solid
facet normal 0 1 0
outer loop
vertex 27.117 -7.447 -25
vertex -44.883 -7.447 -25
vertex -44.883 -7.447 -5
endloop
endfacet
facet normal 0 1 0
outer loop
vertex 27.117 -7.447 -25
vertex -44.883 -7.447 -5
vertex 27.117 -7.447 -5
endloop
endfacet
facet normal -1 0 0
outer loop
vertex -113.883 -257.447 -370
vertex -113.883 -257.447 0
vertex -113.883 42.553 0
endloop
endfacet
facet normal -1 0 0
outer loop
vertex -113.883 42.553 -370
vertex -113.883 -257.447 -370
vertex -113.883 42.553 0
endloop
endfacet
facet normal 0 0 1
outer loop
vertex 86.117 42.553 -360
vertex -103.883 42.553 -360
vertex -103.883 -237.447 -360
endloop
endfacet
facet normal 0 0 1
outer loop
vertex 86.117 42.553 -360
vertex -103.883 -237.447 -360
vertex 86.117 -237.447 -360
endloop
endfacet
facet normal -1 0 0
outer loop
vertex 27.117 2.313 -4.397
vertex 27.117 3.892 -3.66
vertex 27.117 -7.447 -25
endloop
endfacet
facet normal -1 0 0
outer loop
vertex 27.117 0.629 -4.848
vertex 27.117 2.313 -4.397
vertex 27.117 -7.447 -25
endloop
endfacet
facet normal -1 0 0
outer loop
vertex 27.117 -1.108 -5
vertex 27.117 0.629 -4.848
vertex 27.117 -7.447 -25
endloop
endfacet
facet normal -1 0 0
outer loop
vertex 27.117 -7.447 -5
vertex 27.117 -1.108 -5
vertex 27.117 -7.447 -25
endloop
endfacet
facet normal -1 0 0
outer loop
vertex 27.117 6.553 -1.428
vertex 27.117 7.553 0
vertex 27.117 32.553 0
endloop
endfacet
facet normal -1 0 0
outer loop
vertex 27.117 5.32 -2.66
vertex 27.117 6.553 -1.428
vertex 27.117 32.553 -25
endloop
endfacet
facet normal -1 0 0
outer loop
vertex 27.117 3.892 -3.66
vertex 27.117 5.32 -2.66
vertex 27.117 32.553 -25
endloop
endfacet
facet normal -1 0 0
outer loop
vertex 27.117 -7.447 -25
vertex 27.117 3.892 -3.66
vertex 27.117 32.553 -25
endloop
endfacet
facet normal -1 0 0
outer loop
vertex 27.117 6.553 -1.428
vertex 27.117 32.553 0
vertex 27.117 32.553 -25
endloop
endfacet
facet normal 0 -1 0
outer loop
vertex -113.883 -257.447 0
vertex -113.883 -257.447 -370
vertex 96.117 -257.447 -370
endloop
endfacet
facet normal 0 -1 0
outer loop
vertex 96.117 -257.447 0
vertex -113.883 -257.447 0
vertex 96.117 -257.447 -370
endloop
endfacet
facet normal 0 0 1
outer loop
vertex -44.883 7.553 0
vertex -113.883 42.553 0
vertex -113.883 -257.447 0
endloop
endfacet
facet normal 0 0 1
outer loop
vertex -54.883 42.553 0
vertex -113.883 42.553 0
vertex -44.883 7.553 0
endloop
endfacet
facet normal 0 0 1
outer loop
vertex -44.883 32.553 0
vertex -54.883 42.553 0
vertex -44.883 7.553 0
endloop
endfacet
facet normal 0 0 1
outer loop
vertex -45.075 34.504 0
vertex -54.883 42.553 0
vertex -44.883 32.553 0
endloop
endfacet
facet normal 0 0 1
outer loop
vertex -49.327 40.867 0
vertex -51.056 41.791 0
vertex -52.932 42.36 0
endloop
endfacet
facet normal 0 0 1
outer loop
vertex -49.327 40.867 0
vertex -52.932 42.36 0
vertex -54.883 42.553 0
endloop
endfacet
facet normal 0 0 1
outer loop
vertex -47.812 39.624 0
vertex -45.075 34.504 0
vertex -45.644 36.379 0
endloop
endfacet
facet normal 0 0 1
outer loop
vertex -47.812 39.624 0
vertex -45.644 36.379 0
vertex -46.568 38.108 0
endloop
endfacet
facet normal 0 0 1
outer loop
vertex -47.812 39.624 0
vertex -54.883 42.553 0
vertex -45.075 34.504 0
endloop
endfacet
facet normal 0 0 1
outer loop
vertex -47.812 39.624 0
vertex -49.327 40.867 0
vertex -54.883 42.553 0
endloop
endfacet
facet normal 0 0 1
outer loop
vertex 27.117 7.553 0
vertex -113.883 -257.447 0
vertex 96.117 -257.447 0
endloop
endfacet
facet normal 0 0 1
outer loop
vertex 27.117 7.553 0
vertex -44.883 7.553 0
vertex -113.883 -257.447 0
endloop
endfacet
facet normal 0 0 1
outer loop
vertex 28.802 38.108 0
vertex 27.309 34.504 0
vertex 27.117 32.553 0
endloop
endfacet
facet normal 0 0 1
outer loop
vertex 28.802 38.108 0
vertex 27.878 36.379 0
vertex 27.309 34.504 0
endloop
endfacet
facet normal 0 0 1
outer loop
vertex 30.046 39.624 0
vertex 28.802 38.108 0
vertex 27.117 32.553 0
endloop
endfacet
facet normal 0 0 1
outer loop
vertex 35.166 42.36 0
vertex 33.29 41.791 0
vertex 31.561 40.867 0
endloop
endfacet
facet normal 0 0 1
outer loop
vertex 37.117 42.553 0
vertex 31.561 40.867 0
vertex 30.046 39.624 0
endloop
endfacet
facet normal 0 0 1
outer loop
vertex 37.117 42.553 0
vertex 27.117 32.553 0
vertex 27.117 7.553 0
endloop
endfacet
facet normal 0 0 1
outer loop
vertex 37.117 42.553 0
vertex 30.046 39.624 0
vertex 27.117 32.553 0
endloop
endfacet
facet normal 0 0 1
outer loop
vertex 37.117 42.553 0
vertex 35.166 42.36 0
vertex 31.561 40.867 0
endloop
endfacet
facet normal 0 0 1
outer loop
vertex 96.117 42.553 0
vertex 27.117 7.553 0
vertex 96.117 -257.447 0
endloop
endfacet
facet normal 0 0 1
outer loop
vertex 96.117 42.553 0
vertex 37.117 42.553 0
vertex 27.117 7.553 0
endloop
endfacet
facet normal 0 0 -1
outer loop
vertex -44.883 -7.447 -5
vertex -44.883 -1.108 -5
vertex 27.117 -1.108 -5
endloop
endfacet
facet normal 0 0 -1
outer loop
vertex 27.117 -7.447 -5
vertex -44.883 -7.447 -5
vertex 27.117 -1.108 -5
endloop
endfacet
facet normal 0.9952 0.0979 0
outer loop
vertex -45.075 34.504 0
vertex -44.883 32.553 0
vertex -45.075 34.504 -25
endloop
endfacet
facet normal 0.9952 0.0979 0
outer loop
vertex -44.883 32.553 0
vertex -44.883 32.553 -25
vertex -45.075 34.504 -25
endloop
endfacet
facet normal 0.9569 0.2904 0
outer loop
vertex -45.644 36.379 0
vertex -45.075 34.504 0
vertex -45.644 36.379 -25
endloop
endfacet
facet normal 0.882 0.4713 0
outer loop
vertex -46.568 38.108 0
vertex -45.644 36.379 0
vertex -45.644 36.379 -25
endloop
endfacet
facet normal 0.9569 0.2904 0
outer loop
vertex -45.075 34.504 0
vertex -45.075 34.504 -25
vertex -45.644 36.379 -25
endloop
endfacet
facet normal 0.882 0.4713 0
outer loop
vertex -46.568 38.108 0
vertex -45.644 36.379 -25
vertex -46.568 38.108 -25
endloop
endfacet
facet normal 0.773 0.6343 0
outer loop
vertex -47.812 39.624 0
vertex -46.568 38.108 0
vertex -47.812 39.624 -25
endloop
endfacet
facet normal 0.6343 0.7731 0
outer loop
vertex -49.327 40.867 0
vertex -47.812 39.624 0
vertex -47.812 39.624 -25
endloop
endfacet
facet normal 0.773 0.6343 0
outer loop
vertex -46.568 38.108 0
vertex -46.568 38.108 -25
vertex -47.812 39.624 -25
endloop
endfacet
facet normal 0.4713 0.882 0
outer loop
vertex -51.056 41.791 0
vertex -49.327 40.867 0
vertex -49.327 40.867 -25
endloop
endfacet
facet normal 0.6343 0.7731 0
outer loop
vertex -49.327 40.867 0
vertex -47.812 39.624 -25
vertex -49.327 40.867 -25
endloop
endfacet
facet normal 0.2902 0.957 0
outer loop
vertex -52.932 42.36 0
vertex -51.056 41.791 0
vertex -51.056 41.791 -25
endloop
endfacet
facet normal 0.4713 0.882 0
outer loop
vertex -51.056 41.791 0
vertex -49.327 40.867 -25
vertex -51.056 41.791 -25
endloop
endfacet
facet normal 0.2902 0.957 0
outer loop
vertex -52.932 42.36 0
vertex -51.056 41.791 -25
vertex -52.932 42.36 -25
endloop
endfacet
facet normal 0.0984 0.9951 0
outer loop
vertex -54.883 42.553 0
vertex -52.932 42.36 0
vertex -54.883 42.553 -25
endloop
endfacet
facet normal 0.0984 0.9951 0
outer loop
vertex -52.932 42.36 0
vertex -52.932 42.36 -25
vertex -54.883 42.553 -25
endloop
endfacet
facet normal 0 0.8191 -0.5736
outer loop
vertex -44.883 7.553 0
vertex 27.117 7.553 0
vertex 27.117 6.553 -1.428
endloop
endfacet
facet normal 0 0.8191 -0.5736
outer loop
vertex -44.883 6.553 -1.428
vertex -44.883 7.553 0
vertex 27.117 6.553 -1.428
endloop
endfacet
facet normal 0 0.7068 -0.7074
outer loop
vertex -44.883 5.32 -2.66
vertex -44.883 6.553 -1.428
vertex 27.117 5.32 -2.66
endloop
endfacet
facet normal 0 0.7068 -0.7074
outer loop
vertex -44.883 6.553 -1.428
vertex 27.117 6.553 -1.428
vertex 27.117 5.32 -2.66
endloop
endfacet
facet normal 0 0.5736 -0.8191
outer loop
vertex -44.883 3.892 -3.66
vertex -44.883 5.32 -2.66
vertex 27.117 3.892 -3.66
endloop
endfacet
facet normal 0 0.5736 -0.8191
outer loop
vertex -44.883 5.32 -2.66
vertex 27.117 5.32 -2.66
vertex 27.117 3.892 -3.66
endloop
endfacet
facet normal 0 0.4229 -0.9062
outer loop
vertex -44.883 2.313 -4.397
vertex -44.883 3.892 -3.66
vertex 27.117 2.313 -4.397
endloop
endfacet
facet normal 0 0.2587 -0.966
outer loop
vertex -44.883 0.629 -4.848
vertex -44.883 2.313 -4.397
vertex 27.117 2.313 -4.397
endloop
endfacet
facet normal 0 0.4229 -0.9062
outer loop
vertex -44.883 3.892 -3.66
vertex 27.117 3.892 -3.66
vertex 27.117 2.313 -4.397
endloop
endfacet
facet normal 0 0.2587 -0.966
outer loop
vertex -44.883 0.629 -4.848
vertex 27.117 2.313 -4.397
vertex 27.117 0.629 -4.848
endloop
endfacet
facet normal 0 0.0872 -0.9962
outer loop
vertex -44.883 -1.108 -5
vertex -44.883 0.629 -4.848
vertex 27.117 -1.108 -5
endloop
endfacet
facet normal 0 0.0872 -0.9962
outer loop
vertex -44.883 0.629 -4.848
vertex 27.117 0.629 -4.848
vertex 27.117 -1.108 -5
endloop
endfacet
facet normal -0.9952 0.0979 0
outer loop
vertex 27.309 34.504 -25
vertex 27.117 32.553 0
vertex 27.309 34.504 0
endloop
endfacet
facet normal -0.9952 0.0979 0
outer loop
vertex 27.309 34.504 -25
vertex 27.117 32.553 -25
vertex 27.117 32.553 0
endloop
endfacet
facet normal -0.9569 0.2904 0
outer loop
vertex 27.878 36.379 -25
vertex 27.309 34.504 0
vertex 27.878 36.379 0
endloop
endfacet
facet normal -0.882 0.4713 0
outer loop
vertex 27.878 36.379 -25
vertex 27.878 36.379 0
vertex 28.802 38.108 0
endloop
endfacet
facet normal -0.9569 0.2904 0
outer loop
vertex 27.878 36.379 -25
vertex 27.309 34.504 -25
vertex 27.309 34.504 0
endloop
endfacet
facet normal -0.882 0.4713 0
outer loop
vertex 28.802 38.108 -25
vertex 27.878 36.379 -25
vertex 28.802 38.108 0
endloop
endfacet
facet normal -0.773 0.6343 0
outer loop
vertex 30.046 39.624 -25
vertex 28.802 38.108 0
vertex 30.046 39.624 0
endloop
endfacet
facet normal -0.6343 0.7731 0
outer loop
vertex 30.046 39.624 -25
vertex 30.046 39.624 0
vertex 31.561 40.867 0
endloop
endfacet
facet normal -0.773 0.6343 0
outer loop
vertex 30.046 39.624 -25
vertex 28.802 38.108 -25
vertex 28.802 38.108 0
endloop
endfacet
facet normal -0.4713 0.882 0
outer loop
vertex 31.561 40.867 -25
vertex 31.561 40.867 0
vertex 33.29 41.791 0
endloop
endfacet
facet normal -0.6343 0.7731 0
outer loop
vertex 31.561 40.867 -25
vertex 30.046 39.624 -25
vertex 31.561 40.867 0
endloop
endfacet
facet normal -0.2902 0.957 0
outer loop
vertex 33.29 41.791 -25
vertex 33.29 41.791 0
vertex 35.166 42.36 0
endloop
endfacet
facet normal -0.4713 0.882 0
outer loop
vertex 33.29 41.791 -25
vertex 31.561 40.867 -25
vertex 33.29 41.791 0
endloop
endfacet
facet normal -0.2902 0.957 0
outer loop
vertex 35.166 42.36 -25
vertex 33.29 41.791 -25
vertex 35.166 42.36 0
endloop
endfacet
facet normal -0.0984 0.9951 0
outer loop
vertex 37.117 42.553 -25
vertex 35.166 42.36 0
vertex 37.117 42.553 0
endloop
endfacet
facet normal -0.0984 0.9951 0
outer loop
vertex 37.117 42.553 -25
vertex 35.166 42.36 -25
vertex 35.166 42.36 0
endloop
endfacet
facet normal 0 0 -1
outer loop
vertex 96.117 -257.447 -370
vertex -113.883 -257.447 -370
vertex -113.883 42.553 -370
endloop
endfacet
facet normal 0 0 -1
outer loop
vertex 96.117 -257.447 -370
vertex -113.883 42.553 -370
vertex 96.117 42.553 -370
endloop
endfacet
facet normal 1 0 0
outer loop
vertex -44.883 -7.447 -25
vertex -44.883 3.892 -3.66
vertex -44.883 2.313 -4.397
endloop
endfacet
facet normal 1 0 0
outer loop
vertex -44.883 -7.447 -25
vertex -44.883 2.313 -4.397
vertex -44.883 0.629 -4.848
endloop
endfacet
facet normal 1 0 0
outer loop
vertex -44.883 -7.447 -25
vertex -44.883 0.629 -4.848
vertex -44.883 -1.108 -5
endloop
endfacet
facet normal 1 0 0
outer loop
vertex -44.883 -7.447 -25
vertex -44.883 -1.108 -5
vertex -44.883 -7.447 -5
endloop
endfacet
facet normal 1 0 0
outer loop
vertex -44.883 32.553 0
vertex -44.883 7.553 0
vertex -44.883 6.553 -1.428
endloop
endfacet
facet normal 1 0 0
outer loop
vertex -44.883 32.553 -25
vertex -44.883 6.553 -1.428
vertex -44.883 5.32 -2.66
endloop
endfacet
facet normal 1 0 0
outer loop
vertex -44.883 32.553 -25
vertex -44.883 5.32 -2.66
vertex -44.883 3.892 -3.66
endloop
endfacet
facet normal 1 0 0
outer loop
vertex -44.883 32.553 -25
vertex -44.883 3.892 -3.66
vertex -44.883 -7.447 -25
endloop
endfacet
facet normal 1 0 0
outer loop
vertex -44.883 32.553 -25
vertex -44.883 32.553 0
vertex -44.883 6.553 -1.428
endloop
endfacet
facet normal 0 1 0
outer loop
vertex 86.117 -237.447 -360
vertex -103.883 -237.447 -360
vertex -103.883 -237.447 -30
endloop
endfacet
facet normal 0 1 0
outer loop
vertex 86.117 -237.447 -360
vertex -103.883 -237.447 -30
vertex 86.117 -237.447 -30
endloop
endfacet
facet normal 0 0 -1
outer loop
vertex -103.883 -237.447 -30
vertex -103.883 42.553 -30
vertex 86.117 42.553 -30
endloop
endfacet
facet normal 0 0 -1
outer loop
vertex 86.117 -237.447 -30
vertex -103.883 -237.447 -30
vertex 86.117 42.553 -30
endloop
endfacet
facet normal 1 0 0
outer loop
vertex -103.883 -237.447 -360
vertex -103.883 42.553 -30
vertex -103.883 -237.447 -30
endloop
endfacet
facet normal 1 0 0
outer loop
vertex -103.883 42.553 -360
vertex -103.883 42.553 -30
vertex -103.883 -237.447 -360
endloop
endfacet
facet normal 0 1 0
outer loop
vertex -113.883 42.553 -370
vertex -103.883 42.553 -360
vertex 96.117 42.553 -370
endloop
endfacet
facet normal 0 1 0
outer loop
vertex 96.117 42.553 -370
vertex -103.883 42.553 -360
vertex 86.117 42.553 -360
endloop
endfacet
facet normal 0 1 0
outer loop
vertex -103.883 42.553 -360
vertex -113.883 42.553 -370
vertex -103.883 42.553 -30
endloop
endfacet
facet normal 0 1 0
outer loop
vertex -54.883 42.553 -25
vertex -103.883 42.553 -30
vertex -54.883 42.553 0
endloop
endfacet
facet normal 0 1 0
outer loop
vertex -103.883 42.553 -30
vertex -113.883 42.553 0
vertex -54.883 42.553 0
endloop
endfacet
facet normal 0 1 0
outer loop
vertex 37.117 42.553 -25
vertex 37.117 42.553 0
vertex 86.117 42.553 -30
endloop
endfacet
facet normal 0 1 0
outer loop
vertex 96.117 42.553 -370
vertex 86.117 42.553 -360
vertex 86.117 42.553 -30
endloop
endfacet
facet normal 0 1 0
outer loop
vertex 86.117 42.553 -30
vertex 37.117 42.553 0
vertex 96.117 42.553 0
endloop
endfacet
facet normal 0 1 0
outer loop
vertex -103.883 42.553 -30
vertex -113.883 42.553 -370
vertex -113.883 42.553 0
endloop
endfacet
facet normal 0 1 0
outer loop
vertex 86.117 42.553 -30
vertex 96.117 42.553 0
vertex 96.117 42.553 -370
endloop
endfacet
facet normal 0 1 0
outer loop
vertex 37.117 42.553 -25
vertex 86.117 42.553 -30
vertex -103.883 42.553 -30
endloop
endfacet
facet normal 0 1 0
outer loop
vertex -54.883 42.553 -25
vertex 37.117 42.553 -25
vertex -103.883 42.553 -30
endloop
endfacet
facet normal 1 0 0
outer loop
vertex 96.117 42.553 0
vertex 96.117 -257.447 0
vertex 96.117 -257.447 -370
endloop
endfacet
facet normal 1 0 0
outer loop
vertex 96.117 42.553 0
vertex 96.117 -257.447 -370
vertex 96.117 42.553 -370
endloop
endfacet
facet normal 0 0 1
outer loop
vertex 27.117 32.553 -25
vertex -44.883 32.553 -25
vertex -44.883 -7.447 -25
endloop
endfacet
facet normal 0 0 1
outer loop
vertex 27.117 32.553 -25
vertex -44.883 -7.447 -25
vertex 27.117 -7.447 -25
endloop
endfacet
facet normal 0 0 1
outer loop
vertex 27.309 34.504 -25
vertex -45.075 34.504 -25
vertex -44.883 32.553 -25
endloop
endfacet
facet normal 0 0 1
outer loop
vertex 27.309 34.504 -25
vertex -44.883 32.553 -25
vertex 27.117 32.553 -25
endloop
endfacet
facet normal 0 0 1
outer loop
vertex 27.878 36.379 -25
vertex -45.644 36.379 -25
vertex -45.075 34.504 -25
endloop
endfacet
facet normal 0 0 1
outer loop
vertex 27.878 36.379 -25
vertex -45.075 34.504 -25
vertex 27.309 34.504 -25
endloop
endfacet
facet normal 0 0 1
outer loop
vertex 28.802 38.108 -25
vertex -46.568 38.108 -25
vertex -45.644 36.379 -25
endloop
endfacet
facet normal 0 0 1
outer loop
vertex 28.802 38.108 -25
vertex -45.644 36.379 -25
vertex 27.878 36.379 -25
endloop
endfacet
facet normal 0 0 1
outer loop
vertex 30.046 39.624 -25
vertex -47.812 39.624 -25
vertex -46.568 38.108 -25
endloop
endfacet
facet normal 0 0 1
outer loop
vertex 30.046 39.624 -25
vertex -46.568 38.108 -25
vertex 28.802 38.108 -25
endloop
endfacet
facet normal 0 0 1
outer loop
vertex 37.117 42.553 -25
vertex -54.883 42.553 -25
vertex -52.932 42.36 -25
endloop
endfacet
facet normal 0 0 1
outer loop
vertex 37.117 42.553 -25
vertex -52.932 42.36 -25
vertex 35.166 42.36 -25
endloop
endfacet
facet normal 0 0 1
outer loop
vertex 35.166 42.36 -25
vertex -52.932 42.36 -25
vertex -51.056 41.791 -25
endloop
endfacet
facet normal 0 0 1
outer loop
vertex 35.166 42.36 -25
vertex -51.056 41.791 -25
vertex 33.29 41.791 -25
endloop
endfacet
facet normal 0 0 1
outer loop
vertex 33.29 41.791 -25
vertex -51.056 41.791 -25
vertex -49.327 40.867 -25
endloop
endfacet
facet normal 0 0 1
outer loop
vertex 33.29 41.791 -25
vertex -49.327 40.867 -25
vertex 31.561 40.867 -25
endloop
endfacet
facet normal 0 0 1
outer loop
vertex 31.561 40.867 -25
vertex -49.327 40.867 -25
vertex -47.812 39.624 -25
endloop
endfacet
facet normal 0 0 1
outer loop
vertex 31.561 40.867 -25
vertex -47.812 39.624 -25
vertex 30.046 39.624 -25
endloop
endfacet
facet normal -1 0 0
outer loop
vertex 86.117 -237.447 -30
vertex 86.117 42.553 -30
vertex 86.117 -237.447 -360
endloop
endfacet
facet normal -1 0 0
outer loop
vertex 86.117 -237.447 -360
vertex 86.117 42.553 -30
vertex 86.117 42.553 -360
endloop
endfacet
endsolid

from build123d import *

# Parameters (mm, degrees)
ESQUISSE1_W             = 210
ESQUISSE1_H             = 300
BOSS_EXTRU_1_DEPTH      = 370
ESQUISSE2_W             = 190
ESQUISSE2_H             = 330
ENL_V_MAT_EXTRU_1_DEPTH = 280
ESQUISSE5_W             = 72
ESQUISSE5_H             = 25
ENL_V_MAT_EXTRU_4_DEPTH = 35
ESQUISSE6_W             = 72
ESQUISSE6_H             = 20
ENL_V_MAT_EXTRU_5_DEPTH = 15
CONG_5_R                = 10
CONG_6_R                = 10
CONG_7_R                = 10


with BuildPart() as part:
    # Esquisse1 → Boss.-Extru.1 (new body)
    with BuildSketch(Plane.XY):
        with Locations((-8.883179232, -107.447368421)):
            Rectangle(ESQUISSE1_W, ESQUISSE1_H)
    extrude(amount=-BOSS_EXTRU_1_DEPTH)

    # Esquisse2 → Enlèv. mat.-Extru.1 (cut)
    with BuildSketch(Plane(origin=(0, 42.552631579, 0), x_dir=(1, 0, 0), z_dir=(0, 1, 0))):
        with Locations((-8.883179232, 195)):
            Rectangle(ESQUISSE2_W, ESQUISSE2_H)
    extrude(amount=-ENL_V_MAT_EXTRU_1_DEPTH, mode=Mode.SUBTRACT)

    # Esquisse5 → Enlèv. mat.-Extru.4 (cut)
    with BuildSketch(Plane(origin=(0, 42.552631579, 0), x_dir=(1, 0, 0), z_dir=(0, 1, 0))):
        with Locations((-8.883179232, 12.5)):
            Rectangle(ESQUISSE5_W, ESQUISSE5_H)
    extrude(amount=-ENL_V_MAT_EXTRU_4_DEPTH, mode=Mode.SUBTRACT)

    # Esquisse6 → Enlèv. mat.-Extru.5 (cut)
    with BuildSketch(Plane(origin=(0, 7.552631579, 0), x_dir=(1, 0, 0), z_dir=(0, 1, 0))):
        with Locations((-8.883179232, 15)):
            Rectangle(ESQUISSE6_W, ESQUISSE6_H)
    extrude(amount=-ENL_V_MAT_EXTRU_5_DEPTH, mode=Mode.SUBTRACT)

    # Congé5
    cong_5_edges = [part.edges().sort_by_distance(p)[0] for p in [
        (27.116820768, 42.552631579, -12.5),
    ]]
    fillet(cong_5_edges, radius=CONG_5_R)

    # Congé6
    cong_6_edges = [part.edges().sort_by_distance(p)[0] for p in [
        (-44.883179232, 42.552631579, -12.5),
    ]]
    fillet(cong_6_edges, radius=CONG_6_R)

    # Congé7
    # the kernel refuses this fillet: 10 mm, written as the material it takes off along each edge
    with BuildSketch(Plane(origin=(27.116820768, 7.552631579, -5), x_dir=(0, -1, 0), z_dir=(-1, 0, 0))) as cong_7_piece_1:
        with BuildLine():
            CenterArc((8.660254038, 10), CONG_7_R, 210, 60)
            Line((0, 5), (-0.173205081, 4.9))
            ThreePointArc((-0.173205081, 4.9), (-0.2, 2.5), (-0.2, 0))
            Line((-0.2, 0), (0, -0.2))
            Line((0, -0.2), (8.660254038, -0.2))
            Line((8.660254038, -0.2), (8.660254038, 0))
        make_face()
    extrude(amount=72, mode=Mode.SUBTRACT)


solid = part.part
